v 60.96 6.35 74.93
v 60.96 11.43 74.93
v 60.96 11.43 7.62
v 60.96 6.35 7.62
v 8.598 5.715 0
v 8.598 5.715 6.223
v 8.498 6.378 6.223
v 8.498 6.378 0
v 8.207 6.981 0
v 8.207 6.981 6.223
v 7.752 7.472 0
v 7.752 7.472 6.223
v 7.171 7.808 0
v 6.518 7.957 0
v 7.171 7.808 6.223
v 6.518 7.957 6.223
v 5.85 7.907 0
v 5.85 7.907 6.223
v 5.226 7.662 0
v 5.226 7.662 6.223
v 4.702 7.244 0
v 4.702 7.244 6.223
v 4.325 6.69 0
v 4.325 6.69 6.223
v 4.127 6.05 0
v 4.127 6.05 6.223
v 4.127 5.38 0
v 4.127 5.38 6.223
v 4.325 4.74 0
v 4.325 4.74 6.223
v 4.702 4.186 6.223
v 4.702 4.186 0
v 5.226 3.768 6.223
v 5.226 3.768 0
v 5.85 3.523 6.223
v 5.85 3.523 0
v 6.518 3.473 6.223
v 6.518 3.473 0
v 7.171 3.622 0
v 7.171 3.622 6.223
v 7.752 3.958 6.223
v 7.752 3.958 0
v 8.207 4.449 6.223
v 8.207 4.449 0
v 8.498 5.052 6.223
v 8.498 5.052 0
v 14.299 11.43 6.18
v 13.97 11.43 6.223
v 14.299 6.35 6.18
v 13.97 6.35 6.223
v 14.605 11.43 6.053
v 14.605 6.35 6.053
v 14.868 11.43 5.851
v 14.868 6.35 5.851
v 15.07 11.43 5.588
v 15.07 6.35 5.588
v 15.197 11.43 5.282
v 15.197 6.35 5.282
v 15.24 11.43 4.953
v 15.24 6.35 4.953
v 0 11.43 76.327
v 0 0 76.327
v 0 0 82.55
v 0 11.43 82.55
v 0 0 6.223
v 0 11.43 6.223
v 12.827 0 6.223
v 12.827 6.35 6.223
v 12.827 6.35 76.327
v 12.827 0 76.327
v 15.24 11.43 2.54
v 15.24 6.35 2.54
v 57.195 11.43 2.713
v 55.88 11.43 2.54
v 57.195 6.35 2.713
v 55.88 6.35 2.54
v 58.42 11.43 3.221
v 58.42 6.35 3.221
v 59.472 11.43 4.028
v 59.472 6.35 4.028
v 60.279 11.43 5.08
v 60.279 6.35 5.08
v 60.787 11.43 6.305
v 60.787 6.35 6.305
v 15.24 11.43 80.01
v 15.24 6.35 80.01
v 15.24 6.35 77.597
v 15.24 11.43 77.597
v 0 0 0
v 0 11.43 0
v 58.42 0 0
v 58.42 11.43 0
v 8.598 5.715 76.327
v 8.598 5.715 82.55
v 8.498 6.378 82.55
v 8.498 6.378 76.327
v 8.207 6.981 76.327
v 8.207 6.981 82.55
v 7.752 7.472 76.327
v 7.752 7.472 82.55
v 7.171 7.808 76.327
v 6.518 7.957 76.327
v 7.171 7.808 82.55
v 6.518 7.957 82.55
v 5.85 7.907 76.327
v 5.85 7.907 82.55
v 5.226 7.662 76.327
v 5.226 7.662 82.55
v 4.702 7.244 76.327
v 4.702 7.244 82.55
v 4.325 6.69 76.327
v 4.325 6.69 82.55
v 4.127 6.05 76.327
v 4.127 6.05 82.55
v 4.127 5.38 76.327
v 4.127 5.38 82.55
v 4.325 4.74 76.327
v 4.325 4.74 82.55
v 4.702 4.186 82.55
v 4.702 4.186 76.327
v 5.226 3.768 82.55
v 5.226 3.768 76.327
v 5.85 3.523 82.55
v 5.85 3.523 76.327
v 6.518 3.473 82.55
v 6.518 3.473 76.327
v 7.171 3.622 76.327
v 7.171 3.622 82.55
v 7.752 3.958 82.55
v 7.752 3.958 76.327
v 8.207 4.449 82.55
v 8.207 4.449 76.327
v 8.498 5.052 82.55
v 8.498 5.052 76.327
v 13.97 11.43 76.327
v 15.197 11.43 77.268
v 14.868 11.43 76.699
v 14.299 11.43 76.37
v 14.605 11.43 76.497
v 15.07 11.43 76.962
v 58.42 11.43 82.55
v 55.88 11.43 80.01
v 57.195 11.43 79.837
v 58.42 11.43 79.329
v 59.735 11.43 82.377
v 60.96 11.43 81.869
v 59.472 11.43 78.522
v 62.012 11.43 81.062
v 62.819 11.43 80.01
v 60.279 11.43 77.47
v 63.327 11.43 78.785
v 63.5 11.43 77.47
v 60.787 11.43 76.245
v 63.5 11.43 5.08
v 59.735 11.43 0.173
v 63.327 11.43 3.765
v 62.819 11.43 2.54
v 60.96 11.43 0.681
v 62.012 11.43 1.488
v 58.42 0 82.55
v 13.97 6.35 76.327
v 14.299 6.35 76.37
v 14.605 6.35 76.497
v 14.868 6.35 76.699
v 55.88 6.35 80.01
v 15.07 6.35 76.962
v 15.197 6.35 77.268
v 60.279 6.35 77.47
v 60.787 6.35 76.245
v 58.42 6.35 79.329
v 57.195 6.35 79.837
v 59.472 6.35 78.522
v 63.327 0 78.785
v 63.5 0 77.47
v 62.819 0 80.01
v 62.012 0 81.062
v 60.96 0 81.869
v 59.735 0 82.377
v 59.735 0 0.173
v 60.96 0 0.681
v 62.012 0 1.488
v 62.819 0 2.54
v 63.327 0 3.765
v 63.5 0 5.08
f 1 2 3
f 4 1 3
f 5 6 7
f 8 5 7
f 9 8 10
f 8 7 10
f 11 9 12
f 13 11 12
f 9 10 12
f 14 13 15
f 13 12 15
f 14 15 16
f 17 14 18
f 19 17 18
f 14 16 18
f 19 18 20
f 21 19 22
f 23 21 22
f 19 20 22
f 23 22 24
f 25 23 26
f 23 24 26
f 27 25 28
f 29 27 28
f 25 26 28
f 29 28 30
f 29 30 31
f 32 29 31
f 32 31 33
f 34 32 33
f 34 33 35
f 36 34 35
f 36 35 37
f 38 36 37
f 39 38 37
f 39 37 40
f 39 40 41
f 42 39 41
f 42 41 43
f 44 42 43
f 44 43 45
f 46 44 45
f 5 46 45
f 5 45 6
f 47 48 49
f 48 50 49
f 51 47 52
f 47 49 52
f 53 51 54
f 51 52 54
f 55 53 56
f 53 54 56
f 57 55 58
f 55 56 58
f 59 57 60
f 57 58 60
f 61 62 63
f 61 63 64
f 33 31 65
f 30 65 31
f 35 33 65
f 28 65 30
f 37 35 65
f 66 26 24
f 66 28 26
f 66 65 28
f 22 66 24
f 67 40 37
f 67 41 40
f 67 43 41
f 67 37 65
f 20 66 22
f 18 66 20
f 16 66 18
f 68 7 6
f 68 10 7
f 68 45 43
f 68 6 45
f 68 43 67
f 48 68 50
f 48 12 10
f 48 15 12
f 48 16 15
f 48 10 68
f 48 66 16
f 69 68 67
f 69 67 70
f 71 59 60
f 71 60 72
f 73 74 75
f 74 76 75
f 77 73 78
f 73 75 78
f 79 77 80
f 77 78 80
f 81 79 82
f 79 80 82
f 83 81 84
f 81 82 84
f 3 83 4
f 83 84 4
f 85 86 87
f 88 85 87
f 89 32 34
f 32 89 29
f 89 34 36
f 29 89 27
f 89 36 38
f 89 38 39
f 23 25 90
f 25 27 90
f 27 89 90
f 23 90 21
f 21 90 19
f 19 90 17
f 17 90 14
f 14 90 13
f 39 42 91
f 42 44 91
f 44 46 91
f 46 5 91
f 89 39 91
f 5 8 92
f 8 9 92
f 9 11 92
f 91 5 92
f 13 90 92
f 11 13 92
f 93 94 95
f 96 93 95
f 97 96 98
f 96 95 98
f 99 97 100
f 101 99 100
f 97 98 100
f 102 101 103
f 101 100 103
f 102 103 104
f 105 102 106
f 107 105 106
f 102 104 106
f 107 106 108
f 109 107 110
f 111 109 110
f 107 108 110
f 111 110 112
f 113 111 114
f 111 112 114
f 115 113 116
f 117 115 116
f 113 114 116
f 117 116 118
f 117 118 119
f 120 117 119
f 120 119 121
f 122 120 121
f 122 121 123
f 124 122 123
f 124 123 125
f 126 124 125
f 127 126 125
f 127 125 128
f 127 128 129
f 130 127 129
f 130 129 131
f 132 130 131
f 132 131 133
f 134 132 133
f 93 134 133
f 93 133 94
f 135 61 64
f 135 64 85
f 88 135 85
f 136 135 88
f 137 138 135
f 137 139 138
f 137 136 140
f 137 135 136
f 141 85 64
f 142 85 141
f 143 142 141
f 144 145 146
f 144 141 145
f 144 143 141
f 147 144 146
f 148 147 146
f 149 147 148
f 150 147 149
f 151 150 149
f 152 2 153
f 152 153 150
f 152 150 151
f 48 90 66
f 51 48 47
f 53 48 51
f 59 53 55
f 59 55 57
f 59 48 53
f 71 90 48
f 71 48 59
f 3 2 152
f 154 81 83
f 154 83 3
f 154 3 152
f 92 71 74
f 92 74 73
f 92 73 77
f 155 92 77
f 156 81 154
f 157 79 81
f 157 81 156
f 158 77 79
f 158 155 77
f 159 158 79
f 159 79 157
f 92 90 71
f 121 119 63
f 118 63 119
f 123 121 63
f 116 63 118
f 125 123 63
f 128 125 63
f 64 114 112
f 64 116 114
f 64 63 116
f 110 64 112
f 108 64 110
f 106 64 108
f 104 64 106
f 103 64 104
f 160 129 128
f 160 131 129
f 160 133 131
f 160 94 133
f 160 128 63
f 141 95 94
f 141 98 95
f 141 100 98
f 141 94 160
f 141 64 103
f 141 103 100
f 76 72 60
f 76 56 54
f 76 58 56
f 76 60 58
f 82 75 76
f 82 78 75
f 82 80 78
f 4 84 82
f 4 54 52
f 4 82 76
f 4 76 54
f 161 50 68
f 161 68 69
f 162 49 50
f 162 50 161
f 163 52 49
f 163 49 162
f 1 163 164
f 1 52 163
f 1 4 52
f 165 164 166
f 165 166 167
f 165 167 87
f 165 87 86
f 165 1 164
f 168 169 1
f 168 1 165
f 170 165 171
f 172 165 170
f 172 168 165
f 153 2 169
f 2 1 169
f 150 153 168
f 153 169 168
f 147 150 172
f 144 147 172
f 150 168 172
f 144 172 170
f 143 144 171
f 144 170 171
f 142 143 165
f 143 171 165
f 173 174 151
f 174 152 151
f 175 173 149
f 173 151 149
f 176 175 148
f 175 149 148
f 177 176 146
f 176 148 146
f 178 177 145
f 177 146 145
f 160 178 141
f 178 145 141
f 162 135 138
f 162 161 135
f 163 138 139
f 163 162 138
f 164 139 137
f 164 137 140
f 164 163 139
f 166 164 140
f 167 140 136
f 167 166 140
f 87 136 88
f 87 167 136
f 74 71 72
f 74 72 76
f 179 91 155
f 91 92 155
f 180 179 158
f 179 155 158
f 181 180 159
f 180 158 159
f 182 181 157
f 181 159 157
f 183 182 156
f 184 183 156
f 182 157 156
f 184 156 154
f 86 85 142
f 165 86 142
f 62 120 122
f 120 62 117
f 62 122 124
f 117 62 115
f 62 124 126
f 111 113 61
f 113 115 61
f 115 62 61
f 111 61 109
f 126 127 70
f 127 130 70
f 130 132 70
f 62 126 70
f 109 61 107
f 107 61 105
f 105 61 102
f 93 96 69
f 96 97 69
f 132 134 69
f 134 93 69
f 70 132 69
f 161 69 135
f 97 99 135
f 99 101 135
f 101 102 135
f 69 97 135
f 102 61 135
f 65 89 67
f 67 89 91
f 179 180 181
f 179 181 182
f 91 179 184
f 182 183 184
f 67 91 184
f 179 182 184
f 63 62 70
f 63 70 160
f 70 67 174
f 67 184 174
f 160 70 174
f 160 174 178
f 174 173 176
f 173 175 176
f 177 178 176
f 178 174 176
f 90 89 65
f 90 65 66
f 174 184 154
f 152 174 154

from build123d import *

# Parameters (mm, degrees)
SKETCH1_W           = 63.5
SKETCH1_H           = 11.43
BOSS_EXTRUDE1_DEPTH = 82.55
SKETCH2_W           = 45.72
SKETCH2_H           = 77.47
CUT_EXTRUDE1_DEPTH  = 5.08
SKETCH3_W           = 13.335
SKETCH3_H           = 70.104
CUT_EXTRUDE2_DEPTH  = 105.77307574
SKETCH4_W           = 1.905
SKETCH4_H           = 70.104
CUT_EXTRUDE3_DEPTH  = 5.08
FILLET1_R           = 5.08
FILLET2_R           = 5.08
FILLET3_R           = 1.27
SKETCH5_R           = 2.2479
CUT_EXTRUDE4_DEPTH  = 105.77307574
SKETCH6_W           = 70.104
SKETCH6_H           = 6.35
BOSS_EXTRUDE2_DEPTH = 0.508


with BuildPart() as part:
    # Sketch1 → Boss-Extrude1 (new body)
    with BuildSketch(Plane.XY):
        with Locations((31.75, 5.715)):
            Rectangle(SKETCH1_W, SKETCH1_H)
    extrude(amount=BOSS_EXTRUDE1_DEPTH)

    # Sketch2 → Cut-Extrude1 (cut)
    with BuildSketch(Plane(origin=(0, 11.43, 0), x_dir=(1, 0, 0), z_dir=(0, 1, 0))):
        with Locations((38.1, -41.275)):
            Rectangle(SKETCH2_W, SKETCH2_H)
    extrude(amount=-CUT_EXTRUDE1_DEPTH, mode=Mode.SUBTRACT)

    # Sketch3 → Cut-Extrude2 (cut, through all)
    with BuildSketch(Plane(origin=(0, 11.43, 0), x_dir=(1, 0, 0), z_dir=(0, 1, 0))):
        with Locations((6.6675, -41.275)):
            Rectangle(SKETCH3_W, SKETCH3_H)
    extrude(amount=-CUT_EXTRUDE2_DEPTH, mode=Mode.SUBTRACT)

    # Sketch4 → Cut-Extrude3 (cut)
    with BuildSketch(Plane(origin=(0, 11.43, 0), x_dir=(1, 0, 0), z_dir=(0, 1, 0))):
        with Locations((14.2875, -41.275)):
            Rectangle(SKETCH4_W, SKETCH4_H)
    extrude(amount=-CUT_EXTRUDE3_DEPTH, mode=Mode.SUBTRACT)

    # Fillet1
    fillet1_edges = [part.edges().sort_by_distance(p)[0] for p in [
        (60.96, 8.89, 2.54),
        (60.96, 8.89, 80.01),
    ]]
    fillet(fillet1_edges, radius=FILLET1_R)

    # Fillet2
    fillet2_edges = [part.edges().sort_by_distance(p)[0] for p in [
        (63.5, 5.715, 82.55),
        (63.5, 5.715, 0),
    ]]
    fillet(fillet2_edges, radius=FILLET2_R)

    # Fillet3
    fillet3_edges = [part.edges().sort_by_distance(p)[0] for p in [
        (15.24, 8.89, 6.223),
        (15.24, 8.89, 76.327),
    ]]
    fillet(fillet3_edges, radius=FILLET3_R)

    # Sketch5 → Cut-Extrude4 (cut, through all)
    with BuildSketch(Plane.XY.offset(82.55)):
        with Locations((6.35, 5.715)):
            Circle(SKETCH5_R)
    extrude(amount=-CUT_EXTRUDE4_DEPTH, mode=Mode.SUBTRACT)

    # Sketch6 → Boss-Extrude2 (add)
    with BuildSketch(Plane.ZY.offset(-13.335)):
        with Locations((41.275, 3.175)):
            Rectangle(SKETCH6_W, SKETCH6_H)
    extrude(amount=BOSS_EXTRUDE2_DEPTH)


solid = part.part
